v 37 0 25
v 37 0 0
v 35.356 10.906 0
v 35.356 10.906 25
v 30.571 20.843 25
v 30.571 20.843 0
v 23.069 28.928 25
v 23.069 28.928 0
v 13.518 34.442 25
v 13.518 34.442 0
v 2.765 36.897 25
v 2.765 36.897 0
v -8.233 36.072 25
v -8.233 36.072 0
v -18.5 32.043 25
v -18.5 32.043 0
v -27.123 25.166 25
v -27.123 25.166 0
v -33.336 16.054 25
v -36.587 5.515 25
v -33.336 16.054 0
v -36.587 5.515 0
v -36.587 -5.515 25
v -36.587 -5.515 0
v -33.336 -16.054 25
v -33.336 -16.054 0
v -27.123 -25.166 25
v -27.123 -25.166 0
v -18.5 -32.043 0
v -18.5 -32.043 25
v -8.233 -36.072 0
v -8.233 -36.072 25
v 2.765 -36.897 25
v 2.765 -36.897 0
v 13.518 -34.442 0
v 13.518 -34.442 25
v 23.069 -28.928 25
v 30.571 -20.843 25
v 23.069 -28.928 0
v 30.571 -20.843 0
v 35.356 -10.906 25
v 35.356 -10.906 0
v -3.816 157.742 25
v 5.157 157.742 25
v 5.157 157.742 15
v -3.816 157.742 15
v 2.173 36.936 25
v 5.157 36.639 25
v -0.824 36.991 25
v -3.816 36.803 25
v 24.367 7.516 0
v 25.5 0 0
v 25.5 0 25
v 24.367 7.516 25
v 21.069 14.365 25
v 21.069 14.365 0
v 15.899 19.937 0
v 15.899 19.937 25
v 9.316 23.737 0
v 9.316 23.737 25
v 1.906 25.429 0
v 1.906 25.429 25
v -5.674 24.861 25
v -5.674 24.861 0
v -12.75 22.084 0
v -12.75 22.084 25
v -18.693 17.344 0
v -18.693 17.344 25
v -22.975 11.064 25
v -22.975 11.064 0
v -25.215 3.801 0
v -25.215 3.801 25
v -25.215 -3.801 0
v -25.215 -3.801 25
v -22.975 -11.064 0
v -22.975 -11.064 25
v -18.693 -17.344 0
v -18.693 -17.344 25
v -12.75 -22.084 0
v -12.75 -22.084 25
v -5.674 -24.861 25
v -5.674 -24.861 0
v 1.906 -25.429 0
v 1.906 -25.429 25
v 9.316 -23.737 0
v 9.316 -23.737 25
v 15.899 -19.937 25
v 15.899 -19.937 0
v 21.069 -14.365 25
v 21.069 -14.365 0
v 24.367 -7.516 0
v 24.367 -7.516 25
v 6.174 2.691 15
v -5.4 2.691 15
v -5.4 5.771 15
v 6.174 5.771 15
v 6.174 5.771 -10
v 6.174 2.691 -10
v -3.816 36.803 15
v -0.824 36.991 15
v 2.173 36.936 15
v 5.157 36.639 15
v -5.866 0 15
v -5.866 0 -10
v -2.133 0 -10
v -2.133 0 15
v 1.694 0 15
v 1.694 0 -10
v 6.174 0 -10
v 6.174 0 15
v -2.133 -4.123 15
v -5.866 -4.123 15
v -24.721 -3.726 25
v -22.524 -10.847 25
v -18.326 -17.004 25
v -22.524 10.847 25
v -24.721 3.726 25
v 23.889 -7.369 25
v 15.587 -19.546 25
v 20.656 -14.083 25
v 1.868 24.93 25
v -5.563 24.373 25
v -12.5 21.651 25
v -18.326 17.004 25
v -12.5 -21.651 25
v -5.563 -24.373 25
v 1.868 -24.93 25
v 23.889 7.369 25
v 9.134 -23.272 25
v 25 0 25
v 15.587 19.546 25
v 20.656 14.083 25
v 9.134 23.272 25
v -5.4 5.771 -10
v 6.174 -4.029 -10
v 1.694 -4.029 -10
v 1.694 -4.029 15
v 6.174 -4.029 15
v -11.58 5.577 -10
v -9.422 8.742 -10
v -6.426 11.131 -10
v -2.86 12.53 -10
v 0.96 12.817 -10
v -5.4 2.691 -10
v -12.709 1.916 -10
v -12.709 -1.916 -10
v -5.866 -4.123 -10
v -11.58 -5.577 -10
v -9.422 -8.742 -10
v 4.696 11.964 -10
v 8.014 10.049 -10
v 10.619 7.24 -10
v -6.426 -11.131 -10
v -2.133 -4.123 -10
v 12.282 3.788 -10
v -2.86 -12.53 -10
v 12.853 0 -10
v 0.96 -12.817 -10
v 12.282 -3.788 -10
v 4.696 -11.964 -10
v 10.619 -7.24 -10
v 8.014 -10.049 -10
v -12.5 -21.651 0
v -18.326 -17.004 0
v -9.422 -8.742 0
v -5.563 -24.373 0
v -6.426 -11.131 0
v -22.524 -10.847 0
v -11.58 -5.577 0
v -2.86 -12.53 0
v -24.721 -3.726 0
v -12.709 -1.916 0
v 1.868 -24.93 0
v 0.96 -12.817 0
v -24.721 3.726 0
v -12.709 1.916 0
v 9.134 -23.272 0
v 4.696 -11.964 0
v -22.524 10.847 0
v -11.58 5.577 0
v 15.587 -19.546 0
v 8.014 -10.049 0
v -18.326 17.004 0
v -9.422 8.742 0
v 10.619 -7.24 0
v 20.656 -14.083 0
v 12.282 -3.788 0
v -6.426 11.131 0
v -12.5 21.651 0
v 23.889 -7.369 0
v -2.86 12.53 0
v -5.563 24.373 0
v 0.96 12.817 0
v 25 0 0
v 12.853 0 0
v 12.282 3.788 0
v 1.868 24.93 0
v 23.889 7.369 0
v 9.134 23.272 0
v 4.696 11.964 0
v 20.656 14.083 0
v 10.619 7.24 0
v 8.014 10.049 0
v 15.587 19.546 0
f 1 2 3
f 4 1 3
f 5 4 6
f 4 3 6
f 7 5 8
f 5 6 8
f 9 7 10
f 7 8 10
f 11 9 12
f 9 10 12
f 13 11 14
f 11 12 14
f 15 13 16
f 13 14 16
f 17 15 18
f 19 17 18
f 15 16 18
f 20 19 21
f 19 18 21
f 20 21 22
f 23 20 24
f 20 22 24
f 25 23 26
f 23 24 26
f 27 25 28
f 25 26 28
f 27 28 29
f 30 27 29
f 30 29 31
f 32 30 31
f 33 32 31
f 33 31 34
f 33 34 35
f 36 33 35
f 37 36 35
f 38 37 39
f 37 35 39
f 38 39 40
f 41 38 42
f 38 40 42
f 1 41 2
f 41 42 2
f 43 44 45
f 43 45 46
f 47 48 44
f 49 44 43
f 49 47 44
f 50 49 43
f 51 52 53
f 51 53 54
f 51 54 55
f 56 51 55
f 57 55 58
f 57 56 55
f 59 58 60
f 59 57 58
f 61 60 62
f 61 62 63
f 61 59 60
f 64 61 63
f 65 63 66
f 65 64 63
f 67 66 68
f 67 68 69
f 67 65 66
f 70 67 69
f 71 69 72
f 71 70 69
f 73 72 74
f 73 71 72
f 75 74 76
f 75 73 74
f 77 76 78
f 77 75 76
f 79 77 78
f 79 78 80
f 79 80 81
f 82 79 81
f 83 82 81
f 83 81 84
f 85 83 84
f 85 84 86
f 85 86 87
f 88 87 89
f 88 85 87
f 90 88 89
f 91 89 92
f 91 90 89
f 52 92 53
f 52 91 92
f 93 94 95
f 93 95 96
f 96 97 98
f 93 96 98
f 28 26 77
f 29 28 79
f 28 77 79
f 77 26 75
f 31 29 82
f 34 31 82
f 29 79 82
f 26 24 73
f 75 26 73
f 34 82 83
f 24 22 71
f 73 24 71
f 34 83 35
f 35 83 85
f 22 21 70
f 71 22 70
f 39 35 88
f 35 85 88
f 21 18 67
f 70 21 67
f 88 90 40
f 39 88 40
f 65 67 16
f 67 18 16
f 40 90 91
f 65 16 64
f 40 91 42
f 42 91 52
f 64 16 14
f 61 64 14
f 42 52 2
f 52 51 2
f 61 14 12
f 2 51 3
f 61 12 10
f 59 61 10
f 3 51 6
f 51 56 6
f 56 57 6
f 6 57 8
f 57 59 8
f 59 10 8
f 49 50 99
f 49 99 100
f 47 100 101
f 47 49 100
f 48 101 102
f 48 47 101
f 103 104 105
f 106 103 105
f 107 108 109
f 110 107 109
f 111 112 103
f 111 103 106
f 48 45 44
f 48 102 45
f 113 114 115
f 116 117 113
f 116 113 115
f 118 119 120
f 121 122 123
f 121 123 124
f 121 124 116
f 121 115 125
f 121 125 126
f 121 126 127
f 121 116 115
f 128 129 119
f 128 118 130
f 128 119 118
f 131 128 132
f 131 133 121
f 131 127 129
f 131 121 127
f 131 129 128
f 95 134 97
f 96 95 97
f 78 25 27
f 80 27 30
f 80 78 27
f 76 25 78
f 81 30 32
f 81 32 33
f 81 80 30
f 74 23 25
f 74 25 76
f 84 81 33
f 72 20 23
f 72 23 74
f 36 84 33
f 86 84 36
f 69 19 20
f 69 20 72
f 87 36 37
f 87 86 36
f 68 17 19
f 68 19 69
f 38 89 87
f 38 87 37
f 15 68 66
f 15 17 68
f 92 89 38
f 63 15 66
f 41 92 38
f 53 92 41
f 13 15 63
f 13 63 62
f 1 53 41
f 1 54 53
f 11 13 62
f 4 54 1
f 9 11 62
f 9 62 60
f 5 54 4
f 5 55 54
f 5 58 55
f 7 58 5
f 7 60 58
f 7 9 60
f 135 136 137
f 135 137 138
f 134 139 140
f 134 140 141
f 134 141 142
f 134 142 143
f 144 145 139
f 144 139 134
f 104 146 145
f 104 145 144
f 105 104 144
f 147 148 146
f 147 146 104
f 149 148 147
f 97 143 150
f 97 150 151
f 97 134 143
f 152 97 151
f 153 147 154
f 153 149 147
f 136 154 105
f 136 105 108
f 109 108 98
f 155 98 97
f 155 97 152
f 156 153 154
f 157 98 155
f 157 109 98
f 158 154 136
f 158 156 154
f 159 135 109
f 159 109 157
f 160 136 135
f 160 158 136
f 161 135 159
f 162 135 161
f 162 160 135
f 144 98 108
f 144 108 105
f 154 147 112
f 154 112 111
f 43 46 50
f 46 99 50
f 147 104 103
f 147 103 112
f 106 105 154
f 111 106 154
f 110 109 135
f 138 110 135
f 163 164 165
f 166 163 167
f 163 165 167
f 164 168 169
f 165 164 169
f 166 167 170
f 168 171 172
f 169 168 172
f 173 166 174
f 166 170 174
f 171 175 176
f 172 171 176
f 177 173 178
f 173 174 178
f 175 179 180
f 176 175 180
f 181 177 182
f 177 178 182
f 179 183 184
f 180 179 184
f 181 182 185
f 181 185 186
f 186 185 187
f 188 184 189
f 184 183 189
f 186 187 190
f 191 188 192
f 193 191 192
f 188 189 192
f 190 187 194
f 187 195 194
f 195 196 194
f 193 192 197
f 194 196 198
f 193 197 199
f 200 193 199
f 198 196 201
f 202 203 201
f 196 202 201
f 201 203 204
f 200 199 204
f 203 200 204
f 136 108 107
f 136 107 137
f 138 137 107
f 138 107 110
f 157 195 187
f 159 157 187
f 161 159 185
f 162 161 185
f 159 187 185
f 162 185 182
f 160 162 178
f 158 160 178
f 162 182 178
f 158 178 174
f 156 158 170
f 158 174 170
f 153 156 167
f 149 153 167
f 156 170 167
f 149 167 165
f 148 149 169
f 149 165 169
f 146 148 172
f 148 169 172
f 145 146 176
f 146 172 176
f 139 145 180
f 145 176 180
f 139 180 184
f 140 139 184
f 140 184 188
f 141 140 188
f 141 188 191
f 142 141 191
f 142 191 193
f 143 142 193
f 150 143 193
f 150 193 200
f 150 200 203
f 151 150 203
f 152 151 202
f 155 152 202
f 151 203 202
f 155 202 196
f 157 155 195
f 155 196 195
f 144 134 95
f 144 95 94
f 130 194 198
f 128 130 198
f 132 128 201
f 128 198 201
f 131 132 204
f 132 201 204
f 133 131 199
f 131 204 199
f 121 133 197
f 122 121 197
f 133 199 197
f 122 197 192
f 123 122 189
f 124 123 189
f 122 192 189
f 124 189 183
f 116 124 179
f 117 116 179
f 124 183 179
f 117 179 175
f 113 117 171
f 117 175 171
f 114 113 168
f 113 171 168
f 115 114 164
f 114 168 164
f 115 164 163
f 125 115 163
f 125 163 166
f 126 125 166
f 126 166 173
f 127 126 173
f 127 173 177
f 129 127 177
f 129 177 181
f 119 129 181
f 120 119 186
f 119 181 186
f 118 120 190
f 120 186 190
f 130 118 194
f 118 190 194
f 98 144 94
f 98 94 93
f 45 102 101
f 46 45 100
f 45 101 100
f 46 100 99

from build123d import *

# Parameters (mm, degrees)
F0_R      = 25
F1_DEPTH  = 25
F0_R_2    = 37
F0_R_3    = 25.5
F2_DEPTH  = 25
F4_DEPTH  = 10
F4_FACE_W = 8.972482
F4_FACE_H = 10
F5_DEPTH  = 48.5
F6_R      = 12.852711
F7_DEPTH  = 10
F8_W      = 3.733484
F8_H      = 4.122663
F8_W_2    = 4.48018
F8_H_2    = 4.029326
F8_W_3    = 11.5738
F8_H_3    = 3.080124
F9_DEPTH  = 25


with BuildPart() as f1:
    # F0 (on Top) → F1 (new body)
    with BuildSketch(Plane.XY):
        Circle(F0_R)
    extrude(amount=F1_DEPTH)

    # F6 (on face) → F7 (join)
    with BuildSketch(Plane(origin=(0, 0, 0), x_dir=(1, 0, 0), z_dir=(0, 0, -1))):
        Circle(F6_R)
    extrude(amount=F7_DEPTH)

    # F8 (on face) → F9 (cut)
    with BuildSketch(Plane(origin=(0, 0, -10), x_dir=(1, 0, 0), z_dir=(0, 0, -1))):
        with Locations((-3.999566, 2.061332)):
            Rectangle(F8_W, F8_H)
        with Locations((3.934088, 2.014663)):
            Rectangle(F8_W_2, F8_H_2)
        with Locations((0.387278, -4.231007)):
            Rectangle(F8_W_3, F8_H_3)
    extrude(amount=-F9_DEPTH, mode=Mode.SUBTRACT)


with BuildPart() as f2:
    # F0 (on Top) → F2 (new body)
    with BuildSketch(Plane.XY):
        Circle(F0_R_2)
        Circle(F0_R_3, mode=Mode.SUBTRACT)
    extrude(amount=F2_DEPTH)


with BuildPart() as f4:
    # F3 (on face) → F4 (new body)
    with BuildSketch(Plane.XY.offset(25)):
        with BuildLine():
            ThreePointArc((-3.815888, 36.802704), (0.675337, 36.993836), (5.156594, 36.638907))
            Line((5.156594, 36.638907), (5.156594, 109.242164))
            Line((5.156594, 109.242164), (-3.815888, 109.242164))
            Line((-3.815888, 109.242164), (-3.815888, 36.802704))
        make_face()
    extrude(amount=-F4_DEPTH)

    # F4_face (on face) → F5 (join)
    with BuildSketch(Plane(origin=(0.670353, 109.242164, 20), x_dir=(-1, 0, 0), z_dir=(0, 1, 0))):
        Rectangle(F4_FACE_W, F4_FACE_H)
    extrude(amount=F5_DEPTH)


solid = Compound([f1.part, f2.part, f4.part])
